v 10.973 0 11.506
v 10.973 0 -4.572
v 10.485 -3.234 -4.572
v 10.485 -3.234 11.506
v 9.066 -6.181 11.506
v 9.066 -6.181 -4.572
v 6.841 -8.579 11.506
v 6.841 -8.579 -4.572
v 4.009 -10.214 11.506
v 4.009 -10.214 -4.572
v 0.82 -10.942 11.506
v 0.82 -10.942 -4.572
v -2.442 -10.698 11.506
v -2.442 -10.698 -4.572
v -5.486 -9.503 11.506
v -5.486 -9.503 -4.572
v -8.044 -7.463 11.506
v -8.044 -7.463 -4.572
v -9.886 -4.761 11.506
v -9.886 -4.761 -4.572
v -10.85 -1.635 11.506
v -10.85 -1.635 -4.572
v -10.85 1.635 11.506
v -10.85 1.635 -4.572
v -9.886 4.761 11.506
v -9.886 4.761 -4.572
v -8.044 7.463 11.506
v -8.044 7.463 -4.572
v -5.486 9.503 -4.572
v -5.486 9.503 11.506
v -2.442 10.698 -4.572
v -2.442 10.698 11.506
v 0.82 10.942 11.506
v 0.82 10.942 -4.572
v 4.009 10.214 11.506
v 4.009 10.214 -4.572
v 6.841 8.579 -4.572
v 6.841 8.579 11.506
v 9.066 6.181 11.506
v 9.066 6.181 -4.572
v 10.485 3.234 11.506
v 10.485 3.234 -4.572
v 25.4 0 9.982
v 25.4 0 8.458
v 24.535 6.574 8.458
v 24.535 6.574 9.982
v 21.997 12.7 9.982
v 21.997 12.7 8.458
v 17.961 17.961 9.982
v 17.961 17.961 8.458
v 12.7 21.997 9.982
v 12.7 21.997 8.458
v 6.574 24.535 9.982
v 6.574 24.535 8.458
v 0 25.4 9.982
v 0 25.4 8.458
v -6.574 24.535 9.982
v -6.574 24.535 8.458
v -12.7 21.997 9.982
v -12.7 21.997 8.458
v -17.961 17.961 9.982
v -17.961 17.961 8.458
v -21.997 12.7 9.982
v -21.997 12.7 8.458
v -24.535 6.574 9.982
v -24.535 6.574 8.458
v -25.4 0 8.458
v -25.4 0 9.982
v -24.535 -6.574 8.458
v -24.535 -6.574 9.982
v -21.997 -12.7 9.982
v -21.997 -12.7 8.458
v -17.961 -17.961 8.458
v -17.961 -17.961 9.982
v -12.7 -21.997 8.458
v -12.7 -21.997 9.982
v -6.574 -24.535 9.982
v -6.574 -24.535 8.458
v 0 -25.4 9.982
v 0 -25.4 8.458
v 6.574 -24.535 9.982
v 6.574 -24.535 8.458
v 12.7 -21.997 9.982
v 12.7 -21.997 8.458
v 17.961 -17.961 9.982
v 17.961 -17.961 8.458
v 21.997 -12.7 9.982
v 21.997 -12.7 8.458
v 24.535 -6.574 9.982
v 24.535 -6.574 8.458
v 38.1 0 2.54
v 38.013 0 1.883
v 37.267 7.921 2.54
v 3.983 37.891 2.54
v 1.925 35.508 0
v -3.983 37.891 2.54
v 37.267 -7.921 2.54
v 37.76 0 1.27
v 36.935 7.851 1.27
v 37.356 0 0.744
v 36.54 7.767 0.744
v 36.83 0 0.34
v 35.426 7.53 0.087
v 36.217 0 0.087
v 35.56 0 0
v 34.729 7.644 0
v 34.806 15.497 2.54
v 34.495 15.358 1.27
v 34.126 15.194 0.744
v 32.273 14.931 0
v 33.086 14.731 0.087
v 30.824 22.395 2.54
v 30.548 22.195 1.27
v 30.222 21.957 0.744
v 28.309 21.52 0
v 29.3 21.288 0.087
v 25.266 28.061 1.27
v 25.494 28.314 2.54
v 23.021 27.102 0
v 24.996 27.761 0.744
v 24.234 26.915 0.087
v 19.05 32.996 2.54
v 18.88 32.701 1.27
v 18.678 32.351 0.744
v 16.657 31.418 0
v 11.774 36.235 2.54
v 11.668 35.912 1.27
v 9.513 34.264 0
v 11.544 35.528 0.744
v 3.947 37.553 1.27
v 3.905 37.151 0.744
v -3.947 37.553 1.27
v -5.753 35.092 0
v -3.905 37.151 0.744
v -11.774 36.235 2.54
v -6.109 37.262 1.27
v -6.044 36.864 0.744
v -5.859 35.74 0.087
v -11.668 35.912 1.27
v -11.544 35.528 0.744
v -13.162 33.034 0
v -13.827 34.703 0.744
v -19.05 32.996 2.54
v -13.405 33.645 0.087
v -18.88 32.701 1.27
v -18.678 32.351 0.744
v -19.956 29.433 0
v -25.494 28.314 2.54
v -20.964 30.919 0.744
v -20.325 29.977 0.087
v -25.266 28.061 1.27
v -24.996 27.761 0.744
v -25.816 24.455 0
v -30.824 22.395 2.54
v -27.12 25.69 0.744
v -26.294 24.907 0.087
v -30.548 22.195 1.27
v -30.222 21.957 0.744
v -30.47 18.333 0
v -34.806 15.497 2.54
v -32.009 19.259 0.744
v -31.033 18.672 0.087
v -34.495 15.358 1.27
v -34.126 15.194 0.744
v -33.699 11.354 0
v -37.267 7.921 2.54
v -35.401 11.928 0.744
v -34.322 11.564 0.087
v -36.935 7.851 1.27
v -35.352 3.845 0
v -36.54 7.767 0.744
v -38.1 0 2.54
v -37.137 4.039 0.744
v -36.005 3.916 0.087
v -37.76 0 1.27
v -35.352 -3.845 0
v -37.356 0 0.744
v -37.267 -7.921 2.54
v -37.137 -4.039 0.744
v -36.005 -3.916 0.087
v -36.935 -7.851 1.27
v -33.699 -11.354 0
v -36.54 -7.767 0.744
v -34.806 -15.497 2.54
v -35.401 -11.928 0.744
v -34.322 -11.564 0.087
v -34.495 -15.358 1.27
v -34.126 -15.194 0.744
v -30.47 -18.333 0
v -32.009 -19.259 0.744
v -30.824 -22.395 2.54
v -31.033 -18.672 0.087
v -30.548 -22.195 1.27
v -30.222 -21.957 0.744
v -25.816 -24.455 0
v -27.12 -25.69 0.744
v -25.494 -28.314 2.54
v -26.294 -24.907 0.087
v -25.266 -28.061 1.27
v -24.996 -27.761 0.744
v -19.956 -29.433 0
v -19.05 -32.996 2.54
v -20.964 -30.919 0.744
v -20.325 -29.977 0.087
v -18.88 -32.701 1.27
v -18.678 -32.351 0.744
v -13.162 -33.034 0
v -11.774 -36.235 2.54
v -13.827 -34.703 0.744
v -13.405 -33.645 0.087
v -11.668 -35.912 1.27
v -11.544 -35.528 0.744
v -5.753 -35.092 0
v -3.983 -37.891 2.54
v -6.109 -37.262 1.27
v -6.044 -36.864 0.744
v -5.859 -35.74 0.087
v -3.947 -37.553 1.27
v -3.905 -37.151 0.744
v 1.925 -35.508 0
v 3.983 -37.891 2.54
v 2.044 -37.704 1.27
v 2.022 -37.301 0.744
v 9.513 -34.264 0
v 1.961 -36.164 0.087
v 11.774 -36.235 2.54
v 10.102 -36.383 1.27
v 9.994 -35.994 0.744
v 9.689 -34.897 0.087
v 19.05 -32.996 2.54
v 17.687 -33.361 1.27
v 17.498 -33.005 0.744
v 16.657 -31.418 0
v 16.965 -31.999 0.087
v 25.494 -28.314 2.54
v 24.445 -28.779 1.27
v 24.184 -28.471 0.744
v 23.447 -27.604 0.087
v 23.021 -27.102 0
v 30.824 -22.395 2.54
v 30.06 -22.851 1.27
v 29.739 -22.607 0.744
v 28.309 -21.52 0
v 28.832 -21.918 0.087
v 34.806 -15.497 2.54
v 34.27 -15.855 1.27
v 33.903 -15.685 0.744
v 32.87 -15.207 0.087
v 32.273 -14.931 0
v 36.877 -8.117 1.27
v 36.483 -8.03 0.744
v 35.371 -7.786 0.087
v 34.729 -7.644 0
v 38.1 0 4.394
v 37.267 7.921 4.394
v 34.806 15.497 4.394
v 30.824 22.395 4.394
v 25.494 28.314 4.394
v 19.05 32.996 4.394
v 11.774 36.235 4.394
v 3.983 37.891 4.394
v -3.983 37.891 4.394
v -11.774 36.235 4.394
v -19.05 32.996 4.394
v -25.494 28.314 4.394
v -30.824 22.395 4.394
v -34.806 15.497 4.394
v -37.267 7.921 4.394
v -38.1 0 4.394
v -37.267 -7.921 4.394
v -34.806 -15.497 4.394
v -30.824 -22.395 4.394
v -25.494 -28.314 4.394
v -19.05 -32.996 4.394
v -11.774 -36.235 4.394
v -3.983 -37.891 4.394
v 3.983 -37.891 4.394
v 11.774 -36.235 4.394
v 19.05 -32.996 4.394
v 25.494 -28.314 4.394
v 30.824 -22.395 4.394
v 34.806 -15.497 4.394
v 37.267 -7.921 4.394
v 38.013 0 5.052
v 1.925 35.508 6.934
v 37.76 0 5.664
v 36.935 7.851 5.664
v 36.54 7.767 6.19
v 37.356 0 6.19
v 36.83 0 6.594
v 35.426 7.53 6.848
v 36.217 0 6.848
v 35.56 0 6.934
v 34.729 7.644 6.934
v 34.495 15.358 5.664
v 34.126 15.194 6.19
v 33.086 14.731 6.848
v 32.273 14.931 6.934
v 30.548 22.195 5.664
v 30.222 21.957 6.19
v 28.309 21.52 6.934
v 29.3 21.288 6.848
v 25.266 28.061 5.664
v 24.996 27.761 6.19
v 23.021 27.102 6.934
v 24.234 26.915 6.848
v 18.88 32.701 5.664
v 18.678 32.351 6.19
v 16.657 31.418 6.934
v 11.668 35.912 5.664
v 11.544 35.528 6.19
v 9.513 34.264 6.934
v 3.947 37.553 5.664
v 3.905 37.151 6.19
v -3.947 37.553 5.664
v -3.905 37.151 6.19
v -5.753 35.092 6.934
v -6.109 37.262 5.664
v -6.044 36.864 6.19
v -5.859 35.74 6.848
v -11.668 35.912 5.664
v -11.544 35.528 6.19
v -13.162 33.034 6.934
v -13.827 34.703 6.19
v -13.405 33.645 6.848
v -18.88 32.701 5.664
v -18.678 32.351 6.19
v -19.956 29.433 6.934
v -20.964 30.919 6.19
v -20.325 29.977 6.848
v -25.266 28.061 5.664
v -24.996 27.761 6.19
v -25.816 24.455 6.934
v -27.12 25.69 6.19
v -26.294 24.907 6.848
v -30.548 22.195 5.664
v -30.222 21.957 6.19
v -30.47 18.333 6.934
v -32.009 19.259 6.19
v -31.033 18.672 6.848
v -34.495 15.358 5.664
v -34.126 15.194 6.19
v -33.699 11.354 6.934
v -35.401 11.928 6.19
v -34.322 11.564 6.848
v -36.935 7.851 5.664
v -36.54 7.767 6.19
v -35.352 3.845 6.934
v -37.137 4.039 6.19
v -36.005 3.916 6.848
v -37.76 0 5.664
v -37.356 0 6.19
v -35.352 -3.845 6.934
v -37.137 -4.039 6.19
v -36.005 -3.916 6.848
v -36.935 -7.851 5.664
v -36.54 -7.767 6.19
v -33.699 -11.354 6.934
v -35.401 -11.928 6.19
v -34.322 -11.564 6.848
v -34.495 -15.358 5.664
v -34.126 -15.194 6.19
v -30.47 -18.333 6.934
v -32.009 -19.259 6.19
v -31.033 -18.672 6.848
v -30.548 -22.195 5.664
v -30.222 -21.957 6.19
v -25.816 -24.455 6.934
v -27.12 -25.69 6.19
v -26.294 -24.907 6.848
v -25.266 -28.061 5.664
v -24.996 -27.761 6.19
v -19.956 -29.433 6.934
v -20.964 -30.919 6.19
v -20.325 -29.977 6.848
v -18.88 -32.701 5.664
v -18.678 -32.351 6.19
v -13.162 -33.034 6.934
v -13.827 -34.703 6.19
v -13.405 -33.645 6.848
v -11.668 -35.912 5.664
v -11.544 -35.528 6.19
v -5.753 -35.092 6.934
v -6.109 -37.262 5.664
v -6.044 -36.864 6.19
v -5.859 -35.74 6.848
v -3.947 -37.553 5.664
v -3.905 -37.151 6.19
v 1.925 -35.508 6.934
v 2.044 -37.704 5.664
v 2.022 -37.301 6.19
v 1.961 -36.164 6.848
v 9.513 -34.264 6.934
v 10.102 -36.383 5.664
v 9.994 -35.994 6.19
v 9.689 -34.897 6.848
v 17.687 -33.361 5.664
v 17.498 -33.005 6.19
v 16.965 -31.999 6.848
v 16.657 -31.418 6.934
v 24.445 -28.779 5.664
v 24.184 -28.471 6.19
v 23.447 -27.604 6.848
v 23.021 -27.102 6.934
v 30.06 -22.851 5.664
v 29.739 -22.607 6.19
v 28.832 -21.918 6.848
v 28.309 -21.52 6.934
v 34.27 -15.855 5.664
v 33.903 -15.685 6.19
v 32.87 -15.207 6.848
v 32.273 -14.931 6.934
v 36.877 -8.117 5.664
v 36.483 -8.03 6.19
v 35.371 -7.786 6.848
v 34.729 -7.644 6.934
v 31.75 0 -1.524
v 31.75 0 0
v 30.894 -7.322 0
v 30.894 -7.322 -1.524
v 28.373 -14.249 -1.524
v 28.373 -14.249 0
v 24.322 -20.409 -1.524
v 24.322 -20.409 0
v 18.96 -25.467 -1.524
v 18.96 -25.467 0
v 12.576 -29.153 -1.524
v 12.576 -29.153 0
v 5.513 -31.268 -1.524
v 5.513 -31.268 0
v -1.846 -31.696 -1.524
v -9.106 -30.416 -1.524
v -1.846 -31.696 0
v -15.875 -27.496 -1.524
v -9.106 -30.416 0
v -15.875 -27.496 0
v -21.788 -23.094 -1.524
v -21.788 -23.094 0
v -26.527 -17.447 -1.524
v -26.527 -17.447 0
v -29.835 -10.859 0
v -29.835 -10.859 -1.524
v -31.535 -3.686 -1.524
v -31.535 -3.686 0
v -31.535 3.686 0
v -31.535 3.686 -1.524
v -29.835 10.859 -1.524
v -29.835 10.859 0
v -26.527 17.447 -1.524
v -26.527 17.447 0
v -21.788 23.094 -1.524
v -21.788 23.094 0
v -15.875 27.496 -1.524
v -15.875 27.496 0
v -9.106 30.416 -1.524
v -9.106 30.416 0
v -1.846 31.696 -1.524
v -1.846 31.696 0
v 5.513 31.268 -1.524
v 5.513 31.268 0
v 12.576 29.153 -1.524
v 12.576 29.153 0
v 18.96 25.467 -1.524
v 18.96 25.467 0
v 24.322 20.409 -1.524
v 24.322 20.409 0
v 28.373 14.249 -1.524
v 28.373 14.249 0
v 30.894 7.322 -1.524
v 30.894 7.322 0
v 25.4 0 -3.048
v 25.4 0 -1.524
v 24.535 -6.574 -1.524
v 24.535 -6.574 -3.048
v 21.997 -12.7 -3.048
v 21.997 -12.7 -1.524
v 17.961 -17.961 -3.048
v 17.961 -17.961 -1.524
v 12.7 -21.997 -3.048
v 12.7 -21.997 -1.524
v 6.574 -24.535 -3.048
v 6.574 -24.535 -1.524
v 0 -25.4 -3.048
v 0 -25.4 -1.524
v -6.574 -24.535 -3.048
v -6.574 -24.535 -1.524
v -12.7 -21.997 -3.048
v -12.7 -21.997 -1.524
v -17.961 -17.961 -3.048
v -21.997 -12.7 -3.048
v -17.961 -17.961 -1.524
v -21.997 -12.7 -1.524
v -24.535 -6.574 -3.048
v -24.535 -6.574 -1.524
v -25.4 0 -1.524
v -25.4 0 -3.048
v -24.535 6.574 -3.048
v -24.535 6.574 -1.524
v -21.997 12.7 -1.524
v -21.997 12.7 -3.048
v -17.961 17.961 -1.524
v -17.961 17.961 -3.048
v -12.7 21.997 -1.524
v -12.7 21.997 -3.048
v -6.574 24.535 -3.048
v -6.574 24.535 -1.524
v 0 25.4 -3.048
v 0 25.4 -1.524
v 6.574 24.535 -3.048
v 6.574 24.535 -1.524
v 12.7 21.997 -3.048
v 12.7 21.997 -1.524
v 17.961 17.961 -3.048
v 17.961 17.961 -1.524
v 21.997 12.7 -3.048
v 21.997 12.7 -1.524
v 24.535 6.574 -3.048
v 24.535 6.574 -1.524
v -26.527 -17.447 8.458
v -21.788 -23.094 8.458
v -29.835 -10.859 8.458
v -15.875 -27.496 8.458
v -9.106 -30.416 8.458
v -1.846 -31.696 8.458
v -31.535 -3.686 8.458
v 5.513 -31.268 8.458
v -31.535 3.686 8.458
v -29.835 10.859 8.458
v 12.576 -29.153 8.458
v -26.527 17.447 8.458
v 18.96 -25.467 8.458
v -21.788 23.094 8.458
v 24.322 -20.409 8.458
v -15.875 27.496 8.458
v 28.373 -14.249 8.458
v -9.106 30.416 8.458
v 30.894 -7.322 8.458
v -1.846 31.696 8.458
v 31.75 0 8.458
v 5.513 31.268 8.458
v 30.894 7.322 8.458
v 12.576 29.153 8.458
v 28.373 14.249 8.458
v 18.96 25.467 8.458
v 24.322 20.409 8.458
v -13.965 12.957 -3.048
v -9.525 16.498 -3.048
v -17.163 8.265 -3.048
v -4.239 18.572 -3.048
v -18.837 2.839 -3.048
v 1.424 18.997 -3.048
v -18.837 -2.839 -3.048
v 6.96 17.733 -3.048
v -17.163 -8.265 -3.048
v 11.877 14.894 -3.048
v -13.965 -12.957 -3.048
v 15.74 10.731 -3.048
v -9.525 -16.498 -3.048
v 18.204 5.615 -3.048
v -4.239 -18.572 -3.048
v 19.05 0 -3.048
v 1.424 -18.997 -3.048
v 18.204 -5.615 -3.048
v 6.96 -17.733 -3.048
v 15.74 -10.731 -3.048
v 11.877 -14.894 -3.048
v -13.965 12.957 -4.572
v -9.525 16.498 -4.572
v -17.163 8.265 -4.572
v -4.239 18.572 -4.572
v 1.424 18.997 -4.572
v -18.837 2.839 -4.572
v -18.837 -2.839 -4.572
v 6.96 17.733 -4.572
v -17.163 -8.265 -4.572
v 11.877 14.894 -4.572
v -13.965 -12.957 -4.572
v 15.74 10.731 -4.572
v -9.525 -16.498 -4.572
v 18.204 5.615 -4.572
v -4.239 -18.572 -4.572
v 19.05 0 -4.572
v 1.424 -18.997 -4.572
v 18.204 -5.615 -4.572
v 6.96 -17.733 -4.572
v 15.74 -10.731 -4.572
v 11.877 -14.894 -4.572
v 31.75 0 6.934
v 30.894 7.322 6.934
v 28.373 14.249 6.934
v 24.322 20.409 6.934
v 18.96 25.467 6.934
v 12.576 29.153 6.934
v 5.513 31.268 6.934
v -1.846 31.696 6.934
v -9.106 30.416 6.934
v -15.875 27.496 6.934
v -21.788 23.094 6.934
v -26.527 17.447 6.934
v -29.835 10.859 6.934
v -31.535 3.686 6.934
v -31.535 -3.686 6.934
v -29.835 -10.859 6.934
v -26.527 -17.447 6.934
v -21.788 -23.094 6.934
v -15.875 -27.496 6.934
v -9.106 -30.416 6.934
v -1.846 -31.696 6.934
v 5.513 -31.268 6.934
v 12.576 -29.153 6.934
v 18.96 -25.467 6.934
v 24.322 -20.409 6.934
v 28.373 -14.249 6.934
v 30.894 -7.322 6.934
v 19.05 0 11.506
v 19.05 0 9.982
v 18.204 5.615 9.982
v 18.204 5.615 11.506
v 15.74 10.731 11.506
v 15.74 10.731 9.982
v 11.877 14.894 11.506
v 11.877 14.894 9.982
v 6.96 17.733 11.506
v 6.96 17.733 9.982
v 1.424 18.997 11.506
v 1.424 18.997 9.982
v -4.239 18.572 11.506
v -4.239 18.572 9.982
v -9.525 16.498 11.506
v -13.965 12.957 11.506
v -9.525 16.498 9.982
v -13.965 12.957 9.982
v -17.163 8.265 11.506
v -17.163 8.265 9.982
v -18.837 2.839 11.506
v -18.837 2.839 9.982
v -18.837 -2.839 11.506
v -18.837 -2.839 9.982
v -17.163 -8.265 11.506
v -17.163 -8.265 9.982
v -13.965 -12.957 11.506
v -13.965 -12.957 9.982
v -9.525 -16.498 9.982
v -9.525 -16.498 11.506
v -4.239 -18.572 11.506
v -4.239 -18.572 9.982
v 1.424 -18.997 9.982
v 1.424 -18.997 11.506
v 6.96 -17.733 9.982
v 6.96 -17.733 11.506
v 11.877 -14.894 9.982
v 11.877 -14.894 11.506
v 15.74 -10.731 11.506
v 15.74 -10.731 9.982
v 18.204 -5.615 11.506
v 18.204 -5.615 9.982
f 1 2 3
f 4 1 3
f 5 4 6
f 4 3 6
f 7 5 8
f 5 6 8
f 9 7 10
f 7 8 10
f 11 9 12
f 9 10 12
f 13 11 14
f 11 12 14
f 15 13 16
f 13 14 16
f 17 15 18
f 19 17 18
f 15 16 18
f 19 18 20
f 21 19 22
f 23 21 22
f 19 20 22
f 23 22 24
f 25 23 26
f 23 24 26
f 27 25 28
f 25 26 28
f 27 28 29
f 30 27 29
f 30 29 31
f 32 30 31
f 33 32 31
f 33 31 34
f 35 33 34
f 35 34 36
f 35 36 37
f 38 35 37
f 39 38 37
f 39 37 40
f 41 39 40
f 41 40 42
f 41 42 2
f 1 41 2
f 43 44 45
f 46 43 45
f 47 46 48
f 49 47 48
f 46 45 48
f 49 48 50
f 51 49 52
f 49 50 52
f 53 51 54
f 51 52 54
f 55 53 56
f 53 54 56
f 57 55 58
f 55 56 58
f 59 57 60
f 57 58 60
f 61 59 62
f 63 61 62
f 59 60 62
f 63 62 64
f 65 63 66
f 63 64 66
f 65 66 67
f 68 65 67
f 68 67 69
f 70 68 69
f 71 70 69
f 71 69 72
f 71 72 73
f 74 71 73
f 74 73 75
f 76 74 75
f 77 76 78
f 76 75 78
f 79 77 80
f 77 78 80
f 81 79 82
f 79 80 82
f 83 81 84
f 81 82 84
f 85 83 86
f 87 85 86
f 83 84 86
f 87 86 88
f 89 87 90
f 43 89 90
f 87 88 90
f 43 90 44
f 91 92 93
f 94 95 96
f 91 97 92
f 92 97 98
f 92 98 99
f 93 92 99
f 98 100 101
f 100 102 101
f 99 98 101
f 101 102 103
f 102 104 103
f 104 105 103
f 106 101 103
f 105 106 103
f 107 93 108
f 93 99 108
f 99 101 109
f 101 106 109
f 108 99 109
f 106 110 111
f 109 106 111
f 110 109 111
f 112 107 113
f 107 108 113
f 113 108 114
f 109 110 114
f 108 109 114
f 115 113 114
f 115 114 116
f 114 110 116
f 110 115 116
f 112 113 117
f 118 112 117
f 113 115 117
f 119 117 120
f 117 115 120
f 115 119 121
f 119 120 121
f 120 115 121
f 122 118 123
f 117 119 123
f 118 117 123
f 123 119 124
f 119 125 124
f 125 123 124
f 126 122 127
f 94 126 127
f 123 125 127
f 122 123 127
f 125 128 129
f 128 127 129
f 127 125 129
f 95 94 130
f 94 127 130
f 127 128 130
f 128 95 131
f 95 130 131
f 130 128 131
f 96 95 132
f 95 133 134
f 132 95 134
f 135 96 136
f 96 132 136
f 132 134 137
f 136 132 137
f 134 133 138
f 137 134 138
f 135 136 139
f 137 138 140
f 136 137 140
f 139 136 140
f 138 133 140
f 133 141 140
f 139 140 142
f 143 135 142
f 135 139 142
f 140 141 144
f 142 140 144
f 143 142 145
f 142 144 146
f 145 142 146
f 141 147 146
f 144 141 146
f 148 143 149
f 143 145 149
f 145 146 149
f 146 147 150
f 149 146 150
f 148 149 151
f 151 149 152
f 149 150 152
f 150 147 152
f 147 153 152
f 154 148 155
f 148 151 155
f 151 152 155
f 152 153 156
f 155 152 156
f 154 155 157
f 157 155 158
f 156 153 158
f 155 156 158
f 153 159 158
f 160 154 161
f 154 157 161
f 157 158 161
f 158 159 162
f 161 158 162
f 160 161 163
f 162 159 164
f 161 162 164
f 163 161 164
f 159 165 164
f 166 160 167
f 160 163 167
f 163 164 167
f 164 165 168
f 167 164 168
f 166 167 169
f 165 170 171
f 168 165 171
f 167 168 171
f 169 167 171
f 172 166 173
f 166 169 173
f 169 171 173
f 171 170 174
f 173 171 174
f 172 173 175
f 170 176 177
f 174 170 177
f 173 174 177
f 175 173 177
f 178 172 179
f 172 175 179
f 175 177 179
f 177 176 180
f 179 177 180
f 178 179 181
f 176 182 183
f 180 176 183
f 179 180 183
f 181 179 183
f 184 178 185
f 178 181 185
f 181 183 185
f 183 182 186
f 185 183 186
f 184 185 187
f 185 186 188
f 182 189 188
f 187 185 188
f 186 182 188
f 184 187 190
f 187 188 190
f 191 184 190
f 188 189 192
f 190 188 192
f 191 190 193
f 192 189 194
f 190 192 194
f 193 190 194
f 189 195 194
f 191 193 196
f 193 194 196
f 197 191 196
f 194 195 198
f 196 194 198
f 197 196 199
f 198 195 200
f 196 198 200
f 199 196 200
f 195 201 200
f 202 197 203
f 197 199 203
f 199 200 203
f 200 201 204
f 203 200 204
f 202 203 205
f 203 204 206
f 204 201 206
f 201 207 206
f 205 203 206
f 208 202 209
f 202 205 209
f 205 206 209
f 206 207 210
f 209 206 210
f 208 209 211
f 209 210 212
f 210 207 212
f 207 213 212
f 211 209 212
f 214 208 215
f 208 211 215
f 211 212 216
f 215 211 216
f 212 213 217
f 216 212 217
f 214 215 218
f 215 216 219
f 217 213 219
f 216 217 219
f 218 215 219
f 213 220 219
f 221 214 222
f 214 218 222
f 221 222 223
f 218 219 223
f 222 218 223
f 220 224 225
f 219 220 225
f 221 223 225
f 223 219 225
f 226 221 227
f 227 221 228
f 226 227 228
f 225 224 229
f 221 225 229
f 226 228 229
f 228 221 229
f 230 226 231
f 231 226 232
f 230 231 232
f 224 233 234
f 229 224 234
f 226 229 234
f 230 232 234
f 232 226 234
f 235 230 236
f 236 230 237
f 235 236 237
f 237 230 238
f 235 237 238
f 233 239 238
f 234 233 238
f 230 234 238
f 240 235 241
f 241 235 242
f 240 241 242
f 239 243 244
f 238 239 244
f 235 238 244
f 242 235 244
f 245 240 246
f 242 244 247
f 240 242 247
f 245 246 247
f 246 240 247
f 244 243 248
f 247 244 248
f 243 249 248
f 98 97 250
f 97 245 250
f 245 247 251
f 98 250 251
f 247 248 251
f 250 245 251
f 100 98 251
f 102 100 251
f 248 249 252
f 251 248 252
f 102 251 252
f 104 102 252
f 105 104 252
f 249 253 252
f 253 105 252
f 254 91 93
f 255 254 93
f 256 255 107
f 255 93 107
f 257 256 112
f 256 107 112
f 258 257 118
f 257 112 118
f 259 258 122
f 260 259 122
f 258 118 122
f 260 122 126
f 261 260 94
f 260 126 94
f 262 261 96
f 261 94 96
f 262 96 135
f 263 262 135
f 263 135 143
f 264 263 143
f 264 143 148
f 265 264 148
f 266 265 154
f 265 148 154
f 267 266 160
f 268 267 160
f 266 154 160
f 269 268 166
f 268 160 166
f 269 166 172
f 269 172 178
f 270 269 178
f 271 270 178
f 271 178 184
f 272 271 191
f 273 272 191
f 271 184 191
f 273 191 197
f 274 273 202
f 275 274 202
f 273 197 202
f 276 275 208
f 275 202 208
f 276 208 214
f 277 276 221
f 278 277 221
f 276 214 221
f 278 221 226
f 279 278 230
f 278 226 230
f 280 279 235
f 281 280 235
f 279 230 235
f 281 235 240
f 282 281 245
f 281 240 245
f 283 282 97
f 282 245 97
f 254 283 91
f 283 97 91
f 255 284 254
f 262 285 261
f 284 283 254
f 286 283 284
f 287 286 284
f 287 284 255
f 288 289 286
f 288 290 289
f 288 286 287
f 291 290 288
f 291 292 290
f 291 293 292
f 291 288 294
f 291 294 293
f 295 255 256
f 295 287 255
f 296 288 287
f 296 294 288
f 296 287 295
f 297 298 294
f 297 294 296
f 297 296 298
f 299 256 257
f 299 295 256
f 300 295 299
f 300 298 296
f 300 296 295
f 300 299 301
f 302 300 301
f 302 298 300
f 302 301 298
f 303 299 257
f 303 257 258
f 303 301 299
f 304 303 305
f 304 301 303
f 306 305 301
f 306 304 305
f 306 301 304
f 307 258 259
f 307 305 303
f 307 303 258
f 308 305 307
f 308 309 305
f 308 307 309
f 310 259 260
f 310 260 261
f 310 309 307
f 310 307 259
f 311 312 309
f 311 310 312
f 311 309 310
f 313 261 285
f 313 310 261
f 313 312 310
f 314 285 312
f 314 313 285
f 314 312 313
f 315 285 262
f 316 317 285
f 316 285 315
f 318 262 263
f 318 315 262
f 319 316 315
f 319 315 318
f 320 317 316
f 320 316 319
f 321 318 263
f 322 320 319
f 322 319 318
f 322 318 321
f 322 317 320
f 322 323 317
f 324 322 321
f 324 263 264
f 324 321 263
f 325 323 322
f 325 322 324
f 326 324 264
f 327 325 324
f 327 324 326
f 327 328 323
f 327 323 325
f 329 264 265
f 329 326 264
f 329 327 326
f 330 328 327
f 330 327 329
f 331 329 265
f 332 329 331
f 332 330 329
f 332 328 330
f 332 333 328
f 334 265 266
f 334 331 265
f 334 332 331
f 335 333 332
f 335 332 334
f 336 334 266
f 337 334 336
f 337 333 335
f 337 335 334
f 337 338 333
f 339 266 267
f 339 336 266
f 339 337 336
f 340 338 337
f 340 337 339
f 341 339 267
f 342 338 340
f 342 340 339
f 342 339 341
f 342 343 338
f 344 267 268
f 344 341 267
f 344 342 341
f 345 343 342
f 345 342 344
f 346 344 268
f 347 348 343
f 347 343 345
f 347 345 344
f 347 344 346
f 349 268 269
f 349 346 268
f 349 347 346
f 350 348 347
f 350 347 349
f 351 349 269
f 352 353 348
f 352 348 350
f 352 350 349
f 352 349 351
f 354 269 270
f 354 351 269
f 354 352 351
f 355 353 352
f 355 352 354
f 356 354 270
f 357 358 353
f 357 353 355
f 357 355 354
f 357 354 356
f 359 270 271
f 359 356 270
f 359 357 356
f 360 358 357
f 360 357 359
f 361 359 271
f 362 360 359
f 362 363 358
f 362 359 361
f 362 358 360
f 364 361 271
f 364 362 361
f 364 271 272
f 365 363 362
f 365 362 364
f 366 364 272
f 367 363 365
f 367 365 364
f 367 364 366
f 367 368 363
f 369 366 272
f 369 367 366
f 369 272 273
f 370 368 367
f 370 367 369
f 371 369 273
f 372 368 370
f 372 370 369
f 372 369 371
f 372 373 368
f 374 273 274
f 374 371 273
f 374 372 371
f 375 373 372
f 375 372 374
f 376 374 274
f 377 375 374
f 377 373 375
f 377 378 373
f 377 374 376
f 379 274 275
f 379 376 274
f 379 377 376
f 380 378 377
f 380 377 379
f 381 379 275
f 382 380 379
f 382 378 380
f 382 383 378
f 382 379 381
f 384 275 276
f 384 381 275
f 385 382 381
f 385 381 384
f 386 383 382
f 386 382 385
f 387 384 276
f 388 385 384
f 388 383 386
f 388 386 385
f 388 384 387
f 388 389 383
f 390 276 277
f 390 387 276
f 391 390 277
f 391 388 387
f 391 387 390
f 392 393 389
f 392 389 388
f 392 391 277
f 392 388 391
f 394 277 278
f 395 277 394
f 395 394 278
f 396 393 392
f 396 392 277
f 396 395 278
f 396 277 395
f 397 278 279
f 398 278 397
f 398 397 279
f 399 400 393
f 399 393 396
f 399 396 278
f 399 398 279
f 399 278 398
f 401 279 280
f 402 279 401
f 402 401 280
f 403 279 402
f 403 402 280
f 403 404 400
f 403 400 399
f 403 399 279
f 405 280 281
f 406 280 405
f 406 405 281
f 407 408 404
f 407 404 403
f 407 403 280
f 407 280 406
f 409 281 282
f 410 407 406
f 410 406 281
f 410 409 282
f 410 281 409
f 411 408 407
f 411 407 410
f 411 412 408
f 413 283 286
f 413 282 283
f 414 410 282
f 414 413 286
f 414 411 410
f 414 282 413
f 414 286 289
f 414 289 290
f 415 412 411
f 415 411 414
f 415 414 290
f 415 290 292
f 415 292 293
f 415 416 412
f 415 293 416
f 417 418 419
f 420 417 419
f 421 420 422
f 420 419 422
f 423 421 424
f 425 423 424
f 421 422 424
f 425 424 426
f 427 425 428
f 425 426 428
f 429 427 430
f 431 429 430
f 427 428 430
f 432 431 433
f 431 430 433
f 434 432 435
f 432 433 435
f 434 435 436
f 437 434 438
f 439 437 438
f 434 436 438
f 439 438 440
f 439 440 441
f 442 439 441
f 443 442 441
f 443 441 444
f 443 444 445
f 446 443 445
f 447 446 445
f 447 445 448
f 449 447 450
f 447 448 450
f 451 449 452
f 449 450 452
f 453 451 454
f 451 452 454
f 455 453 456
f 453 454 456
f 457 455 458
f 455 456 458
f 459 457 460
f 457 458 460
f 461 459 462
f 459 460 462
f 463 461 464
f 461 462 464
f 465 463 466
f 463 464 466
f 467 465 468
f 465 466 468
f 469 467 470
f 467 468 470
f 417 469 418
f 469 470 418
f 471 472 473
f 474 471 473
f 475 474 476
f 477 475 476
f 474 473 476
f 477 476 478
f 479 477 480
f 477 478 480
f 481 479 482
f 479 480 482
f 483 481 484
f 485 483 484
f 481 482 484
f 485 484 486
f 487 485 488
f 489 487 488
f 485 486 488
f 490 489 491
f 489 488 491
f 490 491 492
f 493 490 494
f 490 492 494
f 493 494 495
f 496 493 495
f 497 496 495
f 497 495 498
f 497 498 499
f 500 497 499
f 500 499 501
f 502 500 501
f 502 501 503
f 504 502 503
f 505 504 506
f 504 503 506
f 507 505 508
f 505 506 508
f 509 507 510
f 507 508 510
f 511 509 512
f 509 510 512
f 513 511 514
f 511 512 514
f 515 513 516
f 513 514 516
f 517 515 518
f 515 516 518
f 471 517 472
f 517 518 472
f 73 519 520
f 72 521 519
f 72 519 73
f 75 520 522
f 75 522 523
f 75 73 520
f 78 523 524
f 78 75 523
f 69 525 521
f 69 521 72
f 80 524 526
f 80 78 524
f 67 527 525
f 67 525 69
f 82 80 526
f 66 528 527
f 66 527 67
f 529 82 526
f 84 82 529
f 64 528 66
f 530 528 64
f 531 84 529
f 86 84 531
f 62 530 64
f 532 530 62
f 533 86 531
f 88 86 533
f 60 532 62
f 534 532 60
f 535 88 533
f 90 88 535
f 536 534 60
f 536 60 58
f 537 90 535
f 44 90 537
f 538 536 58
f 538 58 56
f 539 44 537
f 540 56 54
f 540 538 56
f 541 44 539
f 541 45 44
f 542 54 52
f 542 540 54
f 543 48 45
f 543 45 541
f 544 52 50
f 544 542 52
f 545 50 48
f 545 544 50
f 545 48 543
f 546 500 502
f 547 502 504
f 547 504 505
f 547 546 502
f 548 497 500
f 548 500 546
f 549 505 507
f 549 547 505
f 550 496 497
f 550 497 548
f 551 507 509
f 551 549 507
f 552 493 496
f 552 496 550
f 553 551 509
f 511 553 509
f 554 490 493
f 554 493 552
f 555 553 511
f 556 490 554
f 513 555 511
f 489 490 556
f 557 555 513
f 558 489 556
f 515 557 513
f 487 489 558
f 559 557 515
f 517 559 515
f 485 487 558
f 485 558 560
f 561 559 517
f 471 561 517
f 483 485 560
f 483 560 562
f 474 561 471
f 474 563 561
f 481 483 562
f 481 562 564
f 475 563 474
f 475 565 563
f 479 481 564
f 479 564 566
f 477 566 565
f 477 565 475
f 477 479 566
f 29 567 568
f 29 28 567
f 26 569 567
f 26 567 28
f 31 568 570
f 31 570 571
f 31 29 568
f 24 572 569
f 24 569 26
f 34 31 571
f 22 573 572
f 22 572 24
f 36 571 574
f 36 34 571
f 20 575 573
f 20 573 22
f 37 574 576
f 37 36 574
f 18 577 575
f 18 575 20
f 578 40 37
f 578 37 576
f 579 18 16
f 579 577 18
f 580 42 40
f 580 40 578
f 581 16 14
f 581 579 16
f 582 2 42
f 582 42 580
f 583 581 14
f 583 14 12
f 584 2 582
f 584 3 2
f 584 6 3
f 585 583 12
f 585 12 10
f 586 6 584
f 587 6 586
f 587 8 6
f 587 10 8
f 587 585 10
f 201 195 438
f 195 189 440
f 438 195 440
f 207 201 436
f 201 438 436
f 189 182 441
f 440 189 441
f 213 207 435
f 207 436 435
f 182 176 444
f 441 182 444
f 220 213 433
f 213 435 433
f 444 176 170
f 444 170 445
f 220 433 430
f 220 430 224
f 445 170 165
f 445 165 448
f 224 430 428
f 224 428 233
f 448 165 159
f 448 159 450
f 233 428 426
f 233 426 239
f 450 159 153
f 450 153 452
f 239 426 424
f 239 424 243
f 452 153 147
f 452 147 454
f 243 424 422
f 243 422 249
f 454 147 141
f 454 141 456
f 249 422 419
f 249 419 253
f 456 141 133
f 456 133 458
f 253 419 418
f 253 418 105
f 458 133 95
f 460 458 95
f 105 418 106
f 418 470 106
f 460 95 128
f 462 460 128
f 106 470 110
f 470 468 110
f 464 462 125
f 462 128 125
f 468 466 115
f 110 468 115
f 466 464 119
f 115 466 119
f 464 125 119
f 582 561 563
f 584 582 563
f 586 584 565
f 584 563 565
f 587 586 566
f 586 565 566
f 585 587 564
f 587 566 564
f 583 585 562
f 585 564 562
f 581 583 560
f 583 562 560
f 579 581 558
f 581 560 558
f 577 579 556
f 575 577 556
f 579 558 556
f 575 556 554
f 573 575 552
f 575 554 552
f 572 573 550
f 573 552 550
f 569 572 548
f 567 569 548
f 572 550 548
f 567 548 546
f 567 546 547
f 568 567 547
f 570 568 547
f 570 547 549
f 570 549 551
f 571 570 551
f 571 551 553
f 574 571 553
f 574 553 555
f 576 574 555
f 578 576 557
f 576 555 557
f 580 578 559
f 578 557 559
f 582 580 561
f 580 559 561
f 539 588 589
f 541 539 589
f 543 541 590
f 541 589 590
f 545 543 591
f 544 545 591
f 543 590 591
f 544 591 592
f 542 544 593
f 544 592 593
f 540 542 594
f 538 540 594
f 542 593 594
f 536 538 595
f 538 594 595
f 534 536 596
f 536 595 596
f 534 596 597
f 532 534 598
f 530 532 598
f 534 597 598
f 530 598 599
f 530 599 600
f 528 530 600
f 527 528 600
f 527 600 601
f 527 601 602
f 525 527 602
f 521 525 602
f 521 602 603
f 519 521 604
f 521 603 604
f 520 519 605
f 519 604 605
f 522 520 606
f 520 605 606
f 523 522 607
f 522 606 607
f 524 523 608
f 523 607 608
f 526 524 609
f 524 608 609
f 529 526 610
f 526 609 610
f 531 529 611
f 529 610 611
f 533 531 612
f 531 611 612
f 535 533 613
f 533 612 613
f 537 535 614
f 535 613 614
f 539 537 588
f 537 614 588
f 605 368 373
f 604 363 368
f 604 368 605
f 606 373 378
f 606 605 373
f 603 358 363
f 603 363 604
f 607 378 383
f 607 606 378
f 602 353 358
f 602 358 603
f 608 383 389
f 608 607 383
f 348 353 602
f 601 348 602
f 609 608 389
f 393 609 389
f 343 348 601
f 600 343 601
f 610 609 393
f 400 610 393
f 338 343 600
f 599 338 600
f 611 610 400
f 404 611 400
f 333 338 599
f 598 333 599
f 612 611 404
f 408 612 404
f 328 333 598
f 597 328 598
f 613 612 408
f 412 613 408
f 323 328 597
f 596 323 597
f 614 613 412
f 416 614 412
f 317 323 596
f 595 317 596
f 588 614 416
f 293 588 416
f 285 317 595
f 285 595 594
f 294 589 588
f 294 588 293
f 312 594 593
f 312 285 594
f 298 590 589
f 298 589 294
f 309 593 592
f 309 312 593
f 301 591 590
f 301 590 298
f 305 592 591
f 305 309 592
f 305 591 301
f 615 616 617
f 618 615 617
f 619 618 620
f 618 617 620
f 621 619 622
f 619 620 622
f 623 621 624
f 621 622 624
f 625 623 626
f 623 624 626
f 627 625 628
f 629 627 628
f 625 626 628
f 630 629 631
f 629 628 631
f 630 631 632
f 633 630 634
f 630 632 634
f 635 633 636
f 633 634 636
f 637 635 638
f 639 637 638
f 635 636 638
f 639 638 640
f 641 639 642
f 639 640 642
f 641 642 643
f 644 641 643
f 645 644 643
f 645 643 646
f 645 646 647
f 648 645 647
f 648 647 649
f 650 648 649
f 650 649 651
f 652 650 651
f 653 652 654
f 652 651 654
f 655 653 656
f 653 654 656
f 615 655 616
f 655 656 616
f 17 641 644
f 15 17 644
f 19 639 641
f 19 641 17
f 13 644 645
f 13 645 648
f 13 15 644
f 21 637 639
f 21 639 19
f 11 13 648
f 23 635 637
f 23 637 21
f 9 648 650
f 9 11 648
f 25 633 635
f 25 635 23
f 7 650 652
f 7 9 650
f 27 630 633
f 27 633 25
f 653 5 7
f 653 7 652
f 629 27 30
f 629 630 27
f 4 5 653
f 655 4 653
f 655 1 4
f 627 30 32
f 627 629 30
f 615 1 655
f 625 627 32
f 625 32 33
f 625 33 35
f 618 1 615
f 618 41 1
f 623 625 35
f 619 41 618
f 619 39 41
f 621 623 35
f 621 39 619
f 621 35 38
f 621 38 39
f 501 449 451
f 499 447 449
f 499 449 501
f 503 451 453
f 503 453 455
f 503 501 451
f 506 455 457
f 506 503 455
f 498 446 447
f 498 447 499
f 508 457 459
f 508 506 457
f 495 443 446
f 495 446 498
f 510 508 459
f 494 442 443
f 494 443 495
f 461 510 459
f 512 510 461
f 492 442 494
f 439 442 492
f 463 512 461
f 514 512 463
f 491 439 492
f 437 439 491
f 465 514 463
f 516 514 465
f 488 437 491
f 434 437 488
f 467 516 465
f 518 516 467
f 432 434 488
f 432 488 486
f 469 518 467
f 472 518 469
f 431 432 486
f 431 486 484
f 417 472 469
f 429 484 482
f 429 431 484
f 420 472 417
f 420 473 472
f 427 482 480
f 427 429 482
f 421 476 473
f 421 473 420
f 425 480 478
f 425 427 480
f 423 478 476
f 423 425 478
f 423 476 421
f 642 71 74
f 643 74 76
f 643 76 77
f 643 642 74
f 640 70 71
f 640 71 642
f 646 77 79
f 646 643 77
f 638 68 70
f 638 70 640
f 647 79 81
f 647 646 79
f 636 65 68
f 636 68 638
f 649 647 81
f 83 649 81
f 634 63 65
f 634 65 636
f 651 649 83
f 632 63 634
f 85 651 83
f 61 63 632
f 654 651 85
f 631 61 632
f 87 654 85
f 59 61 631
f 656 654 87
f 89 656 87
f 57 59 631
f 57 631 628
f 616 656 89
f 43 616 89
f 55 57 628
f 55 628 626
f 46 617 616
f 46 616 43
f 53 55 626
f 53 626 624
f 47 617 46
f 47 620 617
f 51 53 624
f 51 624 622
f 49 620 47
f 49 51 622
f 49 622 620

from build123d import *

# Parameters (mm, degrees)
F0_R      = 38.1
F1_DEPTH  = 6.9342
F2_R      = 2.54
F3_R      = 31.75
F4_DEPTH  = 1.524
F6_R      = 19.05
F7_DEPTH  = 1.524
F5_R      = 25.4
F8_DEPTH  = 1.524
F9_R      = 19.05
F10_DEPTH = 1.524
F11_R     = 31.75
F12_DEPTH = 1.524
F13_R     = 25.4
F14_DEPTH = 1.524
F15_R     = 19.05
F16_DEPTH = 1.524
F17_R     = 10.9728
F18_DEPTH = 25.4


with BuildPart() as f1:
    # F0 (on Top) → F1 (new body)
    with BuildSketch(Plane.XY):
        Circle(F0_R)
    extrude(amount=F1_DEPTH)

    # F2
    f2_edges = [f1.edges().sort_by_distance(p)[0] for p in [
        (-38.1, 0, 6.9342),
        (-38.1, 0, 0),
    ]]
    fillet(f2_edges, radius=F2_R)

    # F3 (on face) → F4 (join)
    with BuildSketch(Plane(origin=(0, 0, 0), x_dir=(1, 0, 0), z_dir=(0, 0, -1))):
        Circle(F3_R)
    extrude(amount=F4_DEPTH)

    # F5 (on face) → F8 (join)
    with BuildSketch(Plane(origin=(0, 0, -1.524), x_dir=(1, 0, 0), z_dir=(0, 0, -1))):
        Circle(F5_R)
    extrude(amount=F8_DEPTH)



with BuildPart() as f7:
    # F6 (on face) → F7 (new body)
    with BuildSketch(Plane.XY.offset(8.4582)):
        Circle(F6_R)
    extrude(amount=F7_DEPTH)

    # F9 (on face) → F10 (join)
    with BuildSketch(Plane.XY.offset(9.9822)):
        Circle(F9_R)
    extrude(amount=F10_DEPTH)


with BuildPart() as f1_1:
    add(f1.part)

    add(f7.part)  # F12 merges F7
    # F11 (on face) → F12 (join)
    with BuildSketch(Plane.XY.offset(6.9342)):
        Circle(F11_R)
    extrude(amount=F12_DEPTH)

    # F13 (on face) → F14 (join)
    with BuildSketch(Plane.XY.offset(8.4582)):
        Circle(F13_R)
    extrude(amount=F14_DEPTH)

    # F15 (on face) → F16 (join)
    with BuildSketch(Plane(origin=(0, 0, -3.048), x_dir=(1, 0, 0), z_dir=(0, 0, -1))):
        Circle(F15_R)
    extrude(amount=F16_DEPTH)

    # F17 (on face) → F18 (cut)
    with BuildSketch(Plane(origin=(0, 0, -4.572), x_dir=(1, 0, 0), z_dir=(0, 0, -1))):
        Circle(F17_R)
    extrude(amount=-F18_DEPTH, mode=Mode.SUBTRACT)


solid = f1_1.part
